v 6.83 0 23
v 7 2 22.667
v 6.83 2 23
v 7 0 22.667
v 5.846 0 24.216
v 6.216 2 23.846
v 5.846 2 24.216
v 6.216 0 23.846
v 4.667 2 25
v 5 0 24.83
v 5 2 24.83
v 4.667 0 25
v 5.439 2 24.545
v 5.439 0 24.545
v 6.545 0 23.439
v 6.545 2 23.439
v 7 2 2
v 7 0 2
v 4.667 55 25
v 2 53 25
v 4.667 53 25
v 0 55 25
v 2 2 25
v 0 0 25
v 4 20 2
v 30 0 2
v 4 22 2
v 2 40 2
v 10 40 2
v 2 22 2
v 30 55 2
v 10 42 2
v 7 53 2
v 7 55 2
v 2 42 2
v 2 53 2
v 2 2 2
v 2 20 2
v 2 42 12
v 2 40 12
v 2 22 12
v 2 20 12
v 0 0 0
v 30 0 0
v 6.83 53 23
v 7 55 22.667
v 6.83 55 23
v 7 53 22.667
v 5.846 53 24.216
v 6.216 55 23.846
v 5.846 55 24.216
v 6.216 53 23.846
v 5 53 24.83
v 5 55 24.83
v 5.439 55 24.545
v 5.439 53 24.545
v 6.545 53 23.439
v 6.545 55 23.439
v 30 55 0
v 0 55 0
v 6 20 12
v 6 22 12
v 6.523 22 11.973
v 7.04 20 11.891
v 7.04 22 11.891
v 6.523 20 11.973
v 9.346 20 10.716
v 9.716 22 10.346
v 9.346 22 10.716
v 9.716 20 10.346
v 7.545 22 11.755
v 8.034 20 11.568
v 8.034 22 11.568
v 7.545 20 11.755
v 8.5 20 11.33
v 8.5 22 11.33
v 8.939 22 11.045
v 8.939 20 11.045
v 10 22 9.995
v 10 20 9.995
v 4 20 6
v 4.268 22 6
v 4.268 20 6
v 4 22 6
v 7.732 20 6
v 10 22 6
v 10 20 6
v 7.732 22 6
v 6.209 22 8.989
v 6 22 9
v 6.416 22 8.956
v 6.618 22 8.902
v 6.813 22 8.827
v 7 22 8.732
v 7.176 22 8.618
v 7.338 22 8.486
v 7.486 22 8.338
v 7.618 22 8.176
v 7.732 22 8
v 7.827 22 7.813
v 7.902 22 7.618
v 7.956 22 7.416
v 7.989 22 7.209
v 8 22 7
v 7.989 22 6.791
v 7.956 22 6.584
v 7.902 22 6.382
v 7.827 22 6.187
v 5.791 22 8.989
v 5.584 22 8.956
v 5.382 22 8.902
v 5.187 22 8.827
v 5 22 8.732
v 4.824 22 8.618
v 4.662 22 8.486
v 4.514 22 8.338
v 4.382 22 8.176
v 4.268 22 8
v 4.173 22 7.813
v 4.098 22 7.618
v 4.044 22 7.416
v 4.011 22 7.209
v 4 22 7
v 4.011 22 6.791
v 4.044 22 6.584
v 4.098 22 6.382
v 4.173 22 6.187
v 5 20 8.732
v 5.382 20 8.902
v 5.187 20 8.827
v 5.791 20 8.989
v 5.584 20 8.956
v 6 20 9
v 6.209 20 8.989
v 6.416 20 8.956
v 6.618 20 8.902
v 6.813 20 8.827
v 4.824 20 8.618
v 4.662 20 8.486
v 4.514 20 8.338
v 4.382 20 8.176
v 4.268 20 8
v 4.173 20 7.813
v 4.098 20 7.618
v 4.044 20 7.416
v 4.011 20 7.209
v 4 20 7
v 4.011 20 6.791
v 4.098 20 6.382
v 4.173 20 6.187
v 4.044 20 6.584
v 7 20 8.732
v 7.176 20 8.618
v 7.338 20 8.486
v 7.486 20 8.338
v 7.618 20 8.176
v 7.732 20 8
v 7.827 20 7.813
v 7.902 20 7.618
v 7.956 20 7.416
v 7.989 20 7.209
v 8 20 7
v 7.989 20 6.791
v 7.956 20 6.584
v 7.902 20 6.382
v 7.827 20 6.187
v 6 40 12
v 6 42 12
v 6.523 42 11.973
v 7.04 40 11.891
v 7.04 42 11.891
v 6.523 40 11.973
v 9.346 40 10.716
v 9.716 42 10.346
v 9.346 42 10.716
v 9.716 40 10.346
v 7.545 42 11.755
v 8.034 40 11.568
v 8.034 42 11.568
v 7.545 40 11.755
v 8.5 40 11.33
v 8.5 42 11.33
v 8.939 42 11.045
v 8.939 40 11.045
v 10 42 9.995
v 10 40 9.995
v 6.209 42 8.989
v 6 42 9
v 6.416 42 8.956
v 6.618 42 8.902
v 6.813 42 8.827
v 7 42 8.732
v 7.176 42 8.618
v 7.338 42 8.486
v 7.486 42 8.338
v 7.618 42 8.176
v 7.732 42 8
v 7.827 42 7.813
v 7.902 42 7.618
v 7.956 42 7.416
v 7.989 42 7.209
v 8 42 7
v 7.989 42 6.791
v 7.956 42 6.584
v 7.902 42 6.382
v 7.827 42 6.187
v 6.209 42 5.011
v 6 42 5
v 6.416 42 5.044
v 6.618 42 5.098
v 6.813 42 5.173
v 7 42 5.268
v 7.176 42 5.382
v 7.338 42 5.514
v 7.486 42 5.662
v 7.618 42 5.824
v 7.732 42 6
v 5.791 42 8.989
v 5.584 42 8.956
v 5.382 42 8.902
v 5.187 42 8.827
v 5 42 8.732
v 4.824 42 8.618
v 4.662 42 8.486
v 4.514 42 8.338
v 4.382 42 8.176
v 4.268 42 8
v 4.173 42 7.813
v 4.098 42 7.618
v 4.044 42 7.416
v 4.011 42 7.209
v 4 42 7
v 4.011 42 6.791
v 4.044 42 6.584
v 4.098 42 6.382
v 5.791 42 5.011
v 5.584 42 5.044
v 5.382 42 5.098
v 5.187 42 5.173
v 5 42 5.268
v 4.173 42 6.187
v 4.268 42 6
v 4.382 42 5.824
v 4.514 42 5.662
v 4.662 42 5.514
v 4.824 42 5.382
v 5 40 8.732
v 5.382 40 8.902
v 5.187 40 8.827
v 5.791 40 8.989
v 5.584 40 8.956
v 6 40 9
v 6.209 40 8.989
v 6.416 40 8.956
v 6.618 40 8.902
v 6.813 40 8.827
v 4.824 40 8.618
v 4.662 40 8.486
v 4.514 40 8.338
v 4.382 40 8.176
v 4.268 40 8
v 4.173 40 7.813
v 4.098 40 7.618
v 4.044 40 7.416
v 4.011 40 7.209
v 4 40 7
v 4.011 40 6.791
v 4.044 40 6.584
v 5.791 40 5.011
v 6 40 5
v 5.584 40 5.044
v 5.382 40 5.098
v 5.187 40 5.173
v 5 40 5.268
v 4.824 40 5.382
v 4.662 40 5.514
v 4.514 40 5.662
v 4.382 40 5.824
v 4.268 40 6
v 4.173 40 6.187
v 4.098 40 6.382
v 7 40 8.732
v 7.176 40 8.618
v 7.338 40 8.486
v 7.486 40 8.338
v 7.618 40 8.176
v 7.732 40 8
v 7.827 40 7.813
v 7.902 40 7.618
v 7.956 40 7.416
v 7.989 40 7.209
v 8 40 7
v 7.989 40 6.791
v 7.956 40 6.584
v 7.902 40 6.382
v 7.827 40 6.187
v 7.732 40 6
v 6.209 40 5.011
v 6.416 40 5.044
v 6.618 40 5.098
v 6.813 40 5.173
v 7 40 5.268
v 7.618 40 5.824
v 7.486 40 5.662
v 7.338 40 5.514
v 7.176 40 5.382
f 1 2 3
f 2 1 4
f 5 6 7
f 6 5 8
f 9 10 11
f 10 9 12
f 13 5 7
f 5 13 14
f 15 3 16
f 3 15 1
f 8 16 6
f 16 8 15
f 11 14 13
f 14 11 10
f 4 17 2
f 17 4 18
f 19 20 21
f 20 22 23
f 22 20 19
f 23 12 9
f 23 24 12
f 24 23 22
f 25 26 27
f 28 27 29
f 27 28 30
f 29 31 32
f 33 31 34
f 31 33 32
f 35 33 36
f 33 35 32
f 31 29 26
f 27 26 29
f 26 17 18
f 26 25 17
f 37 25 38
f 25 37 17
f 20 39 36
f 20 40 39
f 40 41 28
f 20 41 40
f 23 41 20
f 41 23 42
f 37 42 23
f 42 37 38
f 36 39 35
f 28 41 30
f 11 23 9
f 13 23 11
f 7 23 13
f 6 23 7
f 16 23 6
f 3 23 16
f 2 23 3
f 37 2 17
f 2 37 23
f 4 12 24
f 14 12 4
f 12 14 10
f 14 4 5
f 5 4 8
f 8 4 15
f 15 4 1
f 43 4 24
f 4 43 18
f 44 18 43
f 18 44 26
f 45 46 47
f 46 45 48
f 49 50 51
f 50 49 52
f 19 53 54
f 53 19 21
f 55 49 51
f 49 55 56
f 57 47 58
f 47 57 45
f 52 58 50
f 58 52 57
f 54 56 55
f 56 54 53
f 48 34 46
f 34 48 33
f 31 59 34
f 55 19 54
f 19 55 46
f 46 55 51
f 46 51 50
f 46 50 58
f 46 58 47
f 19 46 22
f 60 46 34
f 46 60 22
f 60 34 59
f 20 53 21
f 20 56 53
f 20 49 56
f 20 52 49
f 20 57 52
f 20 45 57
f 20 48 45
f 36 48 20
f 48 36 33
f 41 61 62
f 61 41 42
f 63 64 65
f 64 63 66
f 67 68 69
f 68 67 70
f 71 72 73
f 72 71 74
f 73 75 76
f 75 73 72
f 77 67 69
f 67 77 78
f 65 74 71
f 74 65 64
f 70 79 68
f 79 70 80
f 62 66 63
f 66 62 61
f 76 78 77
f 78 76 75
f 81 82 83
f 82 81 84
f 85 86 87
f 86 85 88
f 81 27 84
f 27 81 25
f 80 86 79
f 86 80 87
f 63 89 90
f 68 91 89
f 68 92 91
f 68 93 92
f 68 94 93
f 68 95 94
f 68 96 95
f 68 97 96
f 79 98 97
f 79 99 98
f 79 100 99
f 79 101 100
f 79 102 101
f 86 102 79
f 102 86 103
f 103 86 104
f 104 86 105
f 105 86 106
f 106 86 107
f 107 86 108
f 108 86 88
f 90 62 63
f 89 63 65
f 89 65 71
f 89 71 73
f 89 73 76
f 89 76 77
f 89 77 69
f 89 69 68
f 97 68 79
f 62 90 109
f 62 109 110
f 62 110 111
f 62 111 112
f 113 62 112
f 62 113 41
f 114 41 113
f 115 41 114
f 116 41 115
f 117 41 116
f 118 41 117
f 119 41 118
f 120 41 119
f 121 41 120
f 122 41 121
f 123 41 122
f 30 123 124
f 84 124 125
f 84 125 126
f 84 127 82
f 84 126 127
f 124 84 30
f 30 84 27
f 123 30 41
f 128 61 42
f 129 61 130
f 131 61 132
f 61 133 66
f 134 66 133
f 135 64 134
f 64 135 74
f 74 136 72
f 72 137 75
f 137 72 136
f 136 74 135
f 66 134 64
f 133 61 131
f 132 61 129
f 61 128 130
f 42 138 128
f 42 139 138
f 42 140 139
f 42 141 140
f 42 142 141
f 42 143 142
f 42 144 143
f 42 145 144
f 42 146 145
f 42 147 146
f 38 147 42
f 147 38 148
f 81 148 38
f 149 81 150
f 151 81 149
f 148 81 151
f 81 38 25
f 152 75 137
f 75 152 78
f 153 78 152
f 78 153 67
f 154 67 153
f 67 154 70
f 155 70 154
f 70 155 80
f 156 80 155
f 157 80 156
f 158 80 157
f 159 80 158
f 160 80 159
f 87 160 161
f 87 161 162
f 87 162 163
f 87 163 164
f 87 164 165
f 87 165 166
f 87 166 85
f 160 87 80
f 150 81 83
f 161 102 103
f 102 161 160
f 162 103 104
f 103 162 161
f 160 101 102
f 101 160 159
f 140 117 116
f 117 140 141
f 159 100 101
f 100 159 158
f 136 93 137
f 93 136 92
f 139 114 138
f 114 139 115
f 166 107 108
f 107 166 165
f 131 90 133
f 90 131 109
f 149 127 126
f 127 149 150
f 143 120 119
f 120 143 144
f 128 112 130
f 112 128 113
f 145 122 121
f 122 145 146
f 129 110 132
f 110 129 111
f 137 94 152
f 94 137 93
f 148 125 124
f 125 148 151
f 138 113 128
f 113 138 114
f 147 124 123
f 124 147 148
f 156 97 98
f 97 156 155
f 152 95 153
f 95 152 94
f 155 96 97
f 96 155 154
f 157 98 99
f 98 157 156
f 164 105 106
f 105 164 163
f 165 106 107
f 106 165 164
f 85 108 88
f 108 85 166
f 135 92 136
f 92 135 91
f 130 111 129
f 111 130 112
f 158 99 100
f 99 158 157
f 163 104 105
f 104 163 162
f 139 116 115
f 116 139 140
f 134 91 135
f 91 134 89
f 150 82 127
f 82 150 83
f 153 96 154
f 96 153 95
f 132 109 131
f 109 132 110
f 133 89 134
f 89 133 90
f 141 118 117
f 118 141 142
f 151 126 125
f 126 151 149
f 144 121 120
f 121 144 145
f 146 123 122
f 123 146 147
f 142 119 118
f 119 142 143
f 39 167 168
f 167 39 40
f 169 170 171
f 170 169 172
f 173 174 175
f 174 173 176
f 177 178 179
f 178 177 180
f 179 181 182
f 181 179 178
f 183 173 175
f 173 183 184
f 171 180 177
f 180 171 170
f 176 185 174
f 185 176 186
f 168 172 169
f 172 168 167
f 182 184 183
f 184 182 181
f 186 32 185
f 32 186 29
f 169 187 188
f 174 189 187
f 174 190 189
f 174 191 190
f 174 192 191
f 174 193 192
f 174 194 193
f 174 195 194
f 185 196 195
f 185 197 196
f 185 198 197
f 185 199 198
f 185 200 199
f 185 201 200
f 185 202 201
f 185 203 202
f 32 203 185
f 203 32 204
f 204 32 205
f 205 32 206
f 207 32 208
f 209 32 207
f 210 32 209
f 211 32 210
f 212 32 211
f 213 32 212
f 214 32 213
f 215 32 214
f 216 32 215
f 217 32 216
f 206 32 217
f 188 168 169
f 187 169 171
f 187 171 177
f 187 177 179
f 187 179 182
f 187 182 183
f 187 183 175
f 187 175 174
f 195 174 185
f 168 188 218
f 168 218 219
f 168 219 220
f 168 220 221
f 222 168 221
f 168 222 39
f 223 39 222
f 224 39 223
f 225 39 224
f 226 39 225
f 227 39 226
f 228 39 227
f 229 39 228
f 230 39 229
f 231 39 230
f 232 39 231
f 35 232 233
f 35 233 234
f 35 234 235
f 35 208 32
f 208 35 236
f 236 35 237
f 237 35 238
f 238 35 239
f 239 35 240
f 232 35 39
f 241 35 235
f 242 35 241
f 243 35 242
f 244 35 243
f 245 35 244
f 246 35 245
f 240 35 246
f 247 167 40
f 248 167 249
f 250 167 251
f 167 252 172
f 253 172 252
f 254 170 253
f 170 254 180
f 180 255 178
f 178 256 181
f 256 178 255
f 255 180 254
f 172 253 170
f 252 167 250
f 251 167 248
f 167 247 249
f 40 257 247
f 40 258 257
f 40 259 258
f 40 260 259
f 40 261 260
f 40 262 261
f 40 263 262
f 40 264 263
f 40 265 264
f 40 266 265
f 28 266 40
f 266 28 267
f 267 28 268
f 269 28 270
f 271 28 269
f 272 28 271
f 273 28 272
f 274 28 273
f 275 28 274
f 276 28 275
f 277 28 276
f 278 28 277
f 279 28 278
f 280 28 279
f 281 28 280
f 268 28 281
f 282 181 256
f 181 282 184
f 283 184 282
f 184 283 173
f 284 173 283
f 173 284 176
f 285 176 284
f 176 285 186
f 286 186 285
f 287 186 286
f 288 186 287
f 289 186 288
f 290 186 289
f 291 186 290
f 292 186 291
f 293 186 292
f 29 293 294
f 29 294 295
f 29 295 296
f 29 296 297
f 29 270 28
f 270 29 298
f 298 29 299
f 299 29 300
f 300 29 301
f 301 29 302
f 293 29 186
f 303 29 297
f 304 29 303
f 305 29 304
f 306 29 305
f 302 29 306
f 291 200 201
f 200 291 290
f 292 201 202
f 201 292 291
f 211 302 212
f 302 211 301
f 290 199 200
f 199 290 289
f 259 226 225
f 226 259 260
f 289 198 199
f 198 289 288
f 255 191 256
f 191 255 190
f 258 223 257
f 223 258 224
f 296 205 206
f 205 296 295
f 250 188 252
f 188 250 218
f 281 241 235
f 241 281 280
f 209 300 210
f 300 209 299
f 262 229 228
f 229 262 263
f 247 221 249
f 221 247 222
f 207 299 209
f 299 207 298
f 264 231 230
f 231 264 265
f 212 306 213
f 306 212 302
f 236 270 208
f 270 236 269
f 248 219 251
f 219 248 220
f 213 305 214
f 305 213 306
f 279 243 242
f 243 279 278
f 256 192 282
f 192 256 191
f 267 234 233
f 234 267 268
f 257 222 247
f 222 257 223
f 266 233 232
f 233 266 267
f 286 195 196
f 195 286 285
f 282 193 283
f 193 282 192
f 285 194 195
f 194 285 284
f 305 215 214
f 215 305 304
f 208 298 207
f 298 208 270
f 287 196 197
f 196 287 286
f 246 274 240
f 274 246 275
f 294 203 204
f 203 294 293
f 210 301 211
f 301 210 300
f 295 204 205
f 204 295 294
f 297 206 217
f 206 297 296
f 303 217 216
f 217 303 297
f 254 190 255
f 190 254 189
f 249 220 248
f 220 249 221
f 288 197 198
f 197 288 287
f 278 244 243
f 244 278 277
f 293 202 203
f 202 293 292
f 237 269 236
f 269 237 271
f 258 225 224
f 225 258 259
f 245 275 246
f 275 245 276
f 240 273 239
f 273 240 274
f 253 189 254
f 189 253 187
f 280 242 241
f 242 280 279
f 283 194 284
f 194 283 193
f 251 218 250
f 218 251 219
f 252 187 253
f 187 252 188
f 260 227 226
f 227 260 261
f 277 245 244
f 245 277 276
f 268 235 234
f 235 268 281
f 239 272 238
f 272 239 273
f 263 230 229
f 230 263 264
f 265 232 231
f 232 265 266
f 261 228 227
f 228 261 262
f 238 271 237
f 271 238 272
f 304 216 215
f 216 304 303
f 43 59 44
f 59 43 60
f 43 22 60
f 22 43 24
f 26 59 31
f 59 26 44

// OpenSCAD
$fn = 60;

tickness = 2;
width = 30;
length = 55;
height = 25;

side_support = 5;
hook_height = 12;

hole_size = 2;
hole_x_offset = 2;
hole_z_offset = 3;


module fillet(r=5, t=2) {
  difference() {
    cube([r, t, r]);
    translate ([0,t + (t/2),0])
      rotate(90, [1,0,0])
        cylinder(t*2, r=r);
  }
}

module base() {
  cube([width,length,tickness]);
}

module side() {

  hook1pos = 20;
  hook2pos = 40;

  module support() {
    translate([tickness, 0, tickness])
    difference() {
      cube([side_support, tickness, height-tickness]);
      translate([0.5, -(tickness / 2), (height - tickness) - 4.5])
      fillet(t = tickness * 2, r=5);
    }
  }

  module hook(open = false) {
    translate([tickness, 0, tickness]) {
      difference() {
        cube([(hole_size*2) + tickness * 2, tickness, hook_height-tickness]);
        translate([hole_size+hole_x_offset, 0, hole_size+hole_z_offset])
        rotate(90, [1, 0, 0])
          translate([0 ,0, -tickness - (tickness / 2)])
            cylinder(tickness*2, r=hole_size);
          translate([4, -tickness + (tickness / 2), 5])
            fillet(t = tickness * 2, r=5);

        if (open) {
          translate([hole_x_offset, -tickness + (tickness / 2), 0])
            cube([hole_size*2, tickness * 2, hole_size*2]);
          translate([hole_x_offset + hole_size+tickness - (tickness / 2), -tickness + (tickness / 2), 0])
            cube([hole_size*2, tickness * 2, hole_size * 2]);

        }
      }
    }
  }

  cube([tickness, length, height]);
  support();
  translate([0, length-tickness, 0])
    support();

  translate([0, hook1pos, 0])
  hook(open = true);

  translate([0, hook2pos, 0])
  hook();
}

base();
side();
/* fillet(); */
